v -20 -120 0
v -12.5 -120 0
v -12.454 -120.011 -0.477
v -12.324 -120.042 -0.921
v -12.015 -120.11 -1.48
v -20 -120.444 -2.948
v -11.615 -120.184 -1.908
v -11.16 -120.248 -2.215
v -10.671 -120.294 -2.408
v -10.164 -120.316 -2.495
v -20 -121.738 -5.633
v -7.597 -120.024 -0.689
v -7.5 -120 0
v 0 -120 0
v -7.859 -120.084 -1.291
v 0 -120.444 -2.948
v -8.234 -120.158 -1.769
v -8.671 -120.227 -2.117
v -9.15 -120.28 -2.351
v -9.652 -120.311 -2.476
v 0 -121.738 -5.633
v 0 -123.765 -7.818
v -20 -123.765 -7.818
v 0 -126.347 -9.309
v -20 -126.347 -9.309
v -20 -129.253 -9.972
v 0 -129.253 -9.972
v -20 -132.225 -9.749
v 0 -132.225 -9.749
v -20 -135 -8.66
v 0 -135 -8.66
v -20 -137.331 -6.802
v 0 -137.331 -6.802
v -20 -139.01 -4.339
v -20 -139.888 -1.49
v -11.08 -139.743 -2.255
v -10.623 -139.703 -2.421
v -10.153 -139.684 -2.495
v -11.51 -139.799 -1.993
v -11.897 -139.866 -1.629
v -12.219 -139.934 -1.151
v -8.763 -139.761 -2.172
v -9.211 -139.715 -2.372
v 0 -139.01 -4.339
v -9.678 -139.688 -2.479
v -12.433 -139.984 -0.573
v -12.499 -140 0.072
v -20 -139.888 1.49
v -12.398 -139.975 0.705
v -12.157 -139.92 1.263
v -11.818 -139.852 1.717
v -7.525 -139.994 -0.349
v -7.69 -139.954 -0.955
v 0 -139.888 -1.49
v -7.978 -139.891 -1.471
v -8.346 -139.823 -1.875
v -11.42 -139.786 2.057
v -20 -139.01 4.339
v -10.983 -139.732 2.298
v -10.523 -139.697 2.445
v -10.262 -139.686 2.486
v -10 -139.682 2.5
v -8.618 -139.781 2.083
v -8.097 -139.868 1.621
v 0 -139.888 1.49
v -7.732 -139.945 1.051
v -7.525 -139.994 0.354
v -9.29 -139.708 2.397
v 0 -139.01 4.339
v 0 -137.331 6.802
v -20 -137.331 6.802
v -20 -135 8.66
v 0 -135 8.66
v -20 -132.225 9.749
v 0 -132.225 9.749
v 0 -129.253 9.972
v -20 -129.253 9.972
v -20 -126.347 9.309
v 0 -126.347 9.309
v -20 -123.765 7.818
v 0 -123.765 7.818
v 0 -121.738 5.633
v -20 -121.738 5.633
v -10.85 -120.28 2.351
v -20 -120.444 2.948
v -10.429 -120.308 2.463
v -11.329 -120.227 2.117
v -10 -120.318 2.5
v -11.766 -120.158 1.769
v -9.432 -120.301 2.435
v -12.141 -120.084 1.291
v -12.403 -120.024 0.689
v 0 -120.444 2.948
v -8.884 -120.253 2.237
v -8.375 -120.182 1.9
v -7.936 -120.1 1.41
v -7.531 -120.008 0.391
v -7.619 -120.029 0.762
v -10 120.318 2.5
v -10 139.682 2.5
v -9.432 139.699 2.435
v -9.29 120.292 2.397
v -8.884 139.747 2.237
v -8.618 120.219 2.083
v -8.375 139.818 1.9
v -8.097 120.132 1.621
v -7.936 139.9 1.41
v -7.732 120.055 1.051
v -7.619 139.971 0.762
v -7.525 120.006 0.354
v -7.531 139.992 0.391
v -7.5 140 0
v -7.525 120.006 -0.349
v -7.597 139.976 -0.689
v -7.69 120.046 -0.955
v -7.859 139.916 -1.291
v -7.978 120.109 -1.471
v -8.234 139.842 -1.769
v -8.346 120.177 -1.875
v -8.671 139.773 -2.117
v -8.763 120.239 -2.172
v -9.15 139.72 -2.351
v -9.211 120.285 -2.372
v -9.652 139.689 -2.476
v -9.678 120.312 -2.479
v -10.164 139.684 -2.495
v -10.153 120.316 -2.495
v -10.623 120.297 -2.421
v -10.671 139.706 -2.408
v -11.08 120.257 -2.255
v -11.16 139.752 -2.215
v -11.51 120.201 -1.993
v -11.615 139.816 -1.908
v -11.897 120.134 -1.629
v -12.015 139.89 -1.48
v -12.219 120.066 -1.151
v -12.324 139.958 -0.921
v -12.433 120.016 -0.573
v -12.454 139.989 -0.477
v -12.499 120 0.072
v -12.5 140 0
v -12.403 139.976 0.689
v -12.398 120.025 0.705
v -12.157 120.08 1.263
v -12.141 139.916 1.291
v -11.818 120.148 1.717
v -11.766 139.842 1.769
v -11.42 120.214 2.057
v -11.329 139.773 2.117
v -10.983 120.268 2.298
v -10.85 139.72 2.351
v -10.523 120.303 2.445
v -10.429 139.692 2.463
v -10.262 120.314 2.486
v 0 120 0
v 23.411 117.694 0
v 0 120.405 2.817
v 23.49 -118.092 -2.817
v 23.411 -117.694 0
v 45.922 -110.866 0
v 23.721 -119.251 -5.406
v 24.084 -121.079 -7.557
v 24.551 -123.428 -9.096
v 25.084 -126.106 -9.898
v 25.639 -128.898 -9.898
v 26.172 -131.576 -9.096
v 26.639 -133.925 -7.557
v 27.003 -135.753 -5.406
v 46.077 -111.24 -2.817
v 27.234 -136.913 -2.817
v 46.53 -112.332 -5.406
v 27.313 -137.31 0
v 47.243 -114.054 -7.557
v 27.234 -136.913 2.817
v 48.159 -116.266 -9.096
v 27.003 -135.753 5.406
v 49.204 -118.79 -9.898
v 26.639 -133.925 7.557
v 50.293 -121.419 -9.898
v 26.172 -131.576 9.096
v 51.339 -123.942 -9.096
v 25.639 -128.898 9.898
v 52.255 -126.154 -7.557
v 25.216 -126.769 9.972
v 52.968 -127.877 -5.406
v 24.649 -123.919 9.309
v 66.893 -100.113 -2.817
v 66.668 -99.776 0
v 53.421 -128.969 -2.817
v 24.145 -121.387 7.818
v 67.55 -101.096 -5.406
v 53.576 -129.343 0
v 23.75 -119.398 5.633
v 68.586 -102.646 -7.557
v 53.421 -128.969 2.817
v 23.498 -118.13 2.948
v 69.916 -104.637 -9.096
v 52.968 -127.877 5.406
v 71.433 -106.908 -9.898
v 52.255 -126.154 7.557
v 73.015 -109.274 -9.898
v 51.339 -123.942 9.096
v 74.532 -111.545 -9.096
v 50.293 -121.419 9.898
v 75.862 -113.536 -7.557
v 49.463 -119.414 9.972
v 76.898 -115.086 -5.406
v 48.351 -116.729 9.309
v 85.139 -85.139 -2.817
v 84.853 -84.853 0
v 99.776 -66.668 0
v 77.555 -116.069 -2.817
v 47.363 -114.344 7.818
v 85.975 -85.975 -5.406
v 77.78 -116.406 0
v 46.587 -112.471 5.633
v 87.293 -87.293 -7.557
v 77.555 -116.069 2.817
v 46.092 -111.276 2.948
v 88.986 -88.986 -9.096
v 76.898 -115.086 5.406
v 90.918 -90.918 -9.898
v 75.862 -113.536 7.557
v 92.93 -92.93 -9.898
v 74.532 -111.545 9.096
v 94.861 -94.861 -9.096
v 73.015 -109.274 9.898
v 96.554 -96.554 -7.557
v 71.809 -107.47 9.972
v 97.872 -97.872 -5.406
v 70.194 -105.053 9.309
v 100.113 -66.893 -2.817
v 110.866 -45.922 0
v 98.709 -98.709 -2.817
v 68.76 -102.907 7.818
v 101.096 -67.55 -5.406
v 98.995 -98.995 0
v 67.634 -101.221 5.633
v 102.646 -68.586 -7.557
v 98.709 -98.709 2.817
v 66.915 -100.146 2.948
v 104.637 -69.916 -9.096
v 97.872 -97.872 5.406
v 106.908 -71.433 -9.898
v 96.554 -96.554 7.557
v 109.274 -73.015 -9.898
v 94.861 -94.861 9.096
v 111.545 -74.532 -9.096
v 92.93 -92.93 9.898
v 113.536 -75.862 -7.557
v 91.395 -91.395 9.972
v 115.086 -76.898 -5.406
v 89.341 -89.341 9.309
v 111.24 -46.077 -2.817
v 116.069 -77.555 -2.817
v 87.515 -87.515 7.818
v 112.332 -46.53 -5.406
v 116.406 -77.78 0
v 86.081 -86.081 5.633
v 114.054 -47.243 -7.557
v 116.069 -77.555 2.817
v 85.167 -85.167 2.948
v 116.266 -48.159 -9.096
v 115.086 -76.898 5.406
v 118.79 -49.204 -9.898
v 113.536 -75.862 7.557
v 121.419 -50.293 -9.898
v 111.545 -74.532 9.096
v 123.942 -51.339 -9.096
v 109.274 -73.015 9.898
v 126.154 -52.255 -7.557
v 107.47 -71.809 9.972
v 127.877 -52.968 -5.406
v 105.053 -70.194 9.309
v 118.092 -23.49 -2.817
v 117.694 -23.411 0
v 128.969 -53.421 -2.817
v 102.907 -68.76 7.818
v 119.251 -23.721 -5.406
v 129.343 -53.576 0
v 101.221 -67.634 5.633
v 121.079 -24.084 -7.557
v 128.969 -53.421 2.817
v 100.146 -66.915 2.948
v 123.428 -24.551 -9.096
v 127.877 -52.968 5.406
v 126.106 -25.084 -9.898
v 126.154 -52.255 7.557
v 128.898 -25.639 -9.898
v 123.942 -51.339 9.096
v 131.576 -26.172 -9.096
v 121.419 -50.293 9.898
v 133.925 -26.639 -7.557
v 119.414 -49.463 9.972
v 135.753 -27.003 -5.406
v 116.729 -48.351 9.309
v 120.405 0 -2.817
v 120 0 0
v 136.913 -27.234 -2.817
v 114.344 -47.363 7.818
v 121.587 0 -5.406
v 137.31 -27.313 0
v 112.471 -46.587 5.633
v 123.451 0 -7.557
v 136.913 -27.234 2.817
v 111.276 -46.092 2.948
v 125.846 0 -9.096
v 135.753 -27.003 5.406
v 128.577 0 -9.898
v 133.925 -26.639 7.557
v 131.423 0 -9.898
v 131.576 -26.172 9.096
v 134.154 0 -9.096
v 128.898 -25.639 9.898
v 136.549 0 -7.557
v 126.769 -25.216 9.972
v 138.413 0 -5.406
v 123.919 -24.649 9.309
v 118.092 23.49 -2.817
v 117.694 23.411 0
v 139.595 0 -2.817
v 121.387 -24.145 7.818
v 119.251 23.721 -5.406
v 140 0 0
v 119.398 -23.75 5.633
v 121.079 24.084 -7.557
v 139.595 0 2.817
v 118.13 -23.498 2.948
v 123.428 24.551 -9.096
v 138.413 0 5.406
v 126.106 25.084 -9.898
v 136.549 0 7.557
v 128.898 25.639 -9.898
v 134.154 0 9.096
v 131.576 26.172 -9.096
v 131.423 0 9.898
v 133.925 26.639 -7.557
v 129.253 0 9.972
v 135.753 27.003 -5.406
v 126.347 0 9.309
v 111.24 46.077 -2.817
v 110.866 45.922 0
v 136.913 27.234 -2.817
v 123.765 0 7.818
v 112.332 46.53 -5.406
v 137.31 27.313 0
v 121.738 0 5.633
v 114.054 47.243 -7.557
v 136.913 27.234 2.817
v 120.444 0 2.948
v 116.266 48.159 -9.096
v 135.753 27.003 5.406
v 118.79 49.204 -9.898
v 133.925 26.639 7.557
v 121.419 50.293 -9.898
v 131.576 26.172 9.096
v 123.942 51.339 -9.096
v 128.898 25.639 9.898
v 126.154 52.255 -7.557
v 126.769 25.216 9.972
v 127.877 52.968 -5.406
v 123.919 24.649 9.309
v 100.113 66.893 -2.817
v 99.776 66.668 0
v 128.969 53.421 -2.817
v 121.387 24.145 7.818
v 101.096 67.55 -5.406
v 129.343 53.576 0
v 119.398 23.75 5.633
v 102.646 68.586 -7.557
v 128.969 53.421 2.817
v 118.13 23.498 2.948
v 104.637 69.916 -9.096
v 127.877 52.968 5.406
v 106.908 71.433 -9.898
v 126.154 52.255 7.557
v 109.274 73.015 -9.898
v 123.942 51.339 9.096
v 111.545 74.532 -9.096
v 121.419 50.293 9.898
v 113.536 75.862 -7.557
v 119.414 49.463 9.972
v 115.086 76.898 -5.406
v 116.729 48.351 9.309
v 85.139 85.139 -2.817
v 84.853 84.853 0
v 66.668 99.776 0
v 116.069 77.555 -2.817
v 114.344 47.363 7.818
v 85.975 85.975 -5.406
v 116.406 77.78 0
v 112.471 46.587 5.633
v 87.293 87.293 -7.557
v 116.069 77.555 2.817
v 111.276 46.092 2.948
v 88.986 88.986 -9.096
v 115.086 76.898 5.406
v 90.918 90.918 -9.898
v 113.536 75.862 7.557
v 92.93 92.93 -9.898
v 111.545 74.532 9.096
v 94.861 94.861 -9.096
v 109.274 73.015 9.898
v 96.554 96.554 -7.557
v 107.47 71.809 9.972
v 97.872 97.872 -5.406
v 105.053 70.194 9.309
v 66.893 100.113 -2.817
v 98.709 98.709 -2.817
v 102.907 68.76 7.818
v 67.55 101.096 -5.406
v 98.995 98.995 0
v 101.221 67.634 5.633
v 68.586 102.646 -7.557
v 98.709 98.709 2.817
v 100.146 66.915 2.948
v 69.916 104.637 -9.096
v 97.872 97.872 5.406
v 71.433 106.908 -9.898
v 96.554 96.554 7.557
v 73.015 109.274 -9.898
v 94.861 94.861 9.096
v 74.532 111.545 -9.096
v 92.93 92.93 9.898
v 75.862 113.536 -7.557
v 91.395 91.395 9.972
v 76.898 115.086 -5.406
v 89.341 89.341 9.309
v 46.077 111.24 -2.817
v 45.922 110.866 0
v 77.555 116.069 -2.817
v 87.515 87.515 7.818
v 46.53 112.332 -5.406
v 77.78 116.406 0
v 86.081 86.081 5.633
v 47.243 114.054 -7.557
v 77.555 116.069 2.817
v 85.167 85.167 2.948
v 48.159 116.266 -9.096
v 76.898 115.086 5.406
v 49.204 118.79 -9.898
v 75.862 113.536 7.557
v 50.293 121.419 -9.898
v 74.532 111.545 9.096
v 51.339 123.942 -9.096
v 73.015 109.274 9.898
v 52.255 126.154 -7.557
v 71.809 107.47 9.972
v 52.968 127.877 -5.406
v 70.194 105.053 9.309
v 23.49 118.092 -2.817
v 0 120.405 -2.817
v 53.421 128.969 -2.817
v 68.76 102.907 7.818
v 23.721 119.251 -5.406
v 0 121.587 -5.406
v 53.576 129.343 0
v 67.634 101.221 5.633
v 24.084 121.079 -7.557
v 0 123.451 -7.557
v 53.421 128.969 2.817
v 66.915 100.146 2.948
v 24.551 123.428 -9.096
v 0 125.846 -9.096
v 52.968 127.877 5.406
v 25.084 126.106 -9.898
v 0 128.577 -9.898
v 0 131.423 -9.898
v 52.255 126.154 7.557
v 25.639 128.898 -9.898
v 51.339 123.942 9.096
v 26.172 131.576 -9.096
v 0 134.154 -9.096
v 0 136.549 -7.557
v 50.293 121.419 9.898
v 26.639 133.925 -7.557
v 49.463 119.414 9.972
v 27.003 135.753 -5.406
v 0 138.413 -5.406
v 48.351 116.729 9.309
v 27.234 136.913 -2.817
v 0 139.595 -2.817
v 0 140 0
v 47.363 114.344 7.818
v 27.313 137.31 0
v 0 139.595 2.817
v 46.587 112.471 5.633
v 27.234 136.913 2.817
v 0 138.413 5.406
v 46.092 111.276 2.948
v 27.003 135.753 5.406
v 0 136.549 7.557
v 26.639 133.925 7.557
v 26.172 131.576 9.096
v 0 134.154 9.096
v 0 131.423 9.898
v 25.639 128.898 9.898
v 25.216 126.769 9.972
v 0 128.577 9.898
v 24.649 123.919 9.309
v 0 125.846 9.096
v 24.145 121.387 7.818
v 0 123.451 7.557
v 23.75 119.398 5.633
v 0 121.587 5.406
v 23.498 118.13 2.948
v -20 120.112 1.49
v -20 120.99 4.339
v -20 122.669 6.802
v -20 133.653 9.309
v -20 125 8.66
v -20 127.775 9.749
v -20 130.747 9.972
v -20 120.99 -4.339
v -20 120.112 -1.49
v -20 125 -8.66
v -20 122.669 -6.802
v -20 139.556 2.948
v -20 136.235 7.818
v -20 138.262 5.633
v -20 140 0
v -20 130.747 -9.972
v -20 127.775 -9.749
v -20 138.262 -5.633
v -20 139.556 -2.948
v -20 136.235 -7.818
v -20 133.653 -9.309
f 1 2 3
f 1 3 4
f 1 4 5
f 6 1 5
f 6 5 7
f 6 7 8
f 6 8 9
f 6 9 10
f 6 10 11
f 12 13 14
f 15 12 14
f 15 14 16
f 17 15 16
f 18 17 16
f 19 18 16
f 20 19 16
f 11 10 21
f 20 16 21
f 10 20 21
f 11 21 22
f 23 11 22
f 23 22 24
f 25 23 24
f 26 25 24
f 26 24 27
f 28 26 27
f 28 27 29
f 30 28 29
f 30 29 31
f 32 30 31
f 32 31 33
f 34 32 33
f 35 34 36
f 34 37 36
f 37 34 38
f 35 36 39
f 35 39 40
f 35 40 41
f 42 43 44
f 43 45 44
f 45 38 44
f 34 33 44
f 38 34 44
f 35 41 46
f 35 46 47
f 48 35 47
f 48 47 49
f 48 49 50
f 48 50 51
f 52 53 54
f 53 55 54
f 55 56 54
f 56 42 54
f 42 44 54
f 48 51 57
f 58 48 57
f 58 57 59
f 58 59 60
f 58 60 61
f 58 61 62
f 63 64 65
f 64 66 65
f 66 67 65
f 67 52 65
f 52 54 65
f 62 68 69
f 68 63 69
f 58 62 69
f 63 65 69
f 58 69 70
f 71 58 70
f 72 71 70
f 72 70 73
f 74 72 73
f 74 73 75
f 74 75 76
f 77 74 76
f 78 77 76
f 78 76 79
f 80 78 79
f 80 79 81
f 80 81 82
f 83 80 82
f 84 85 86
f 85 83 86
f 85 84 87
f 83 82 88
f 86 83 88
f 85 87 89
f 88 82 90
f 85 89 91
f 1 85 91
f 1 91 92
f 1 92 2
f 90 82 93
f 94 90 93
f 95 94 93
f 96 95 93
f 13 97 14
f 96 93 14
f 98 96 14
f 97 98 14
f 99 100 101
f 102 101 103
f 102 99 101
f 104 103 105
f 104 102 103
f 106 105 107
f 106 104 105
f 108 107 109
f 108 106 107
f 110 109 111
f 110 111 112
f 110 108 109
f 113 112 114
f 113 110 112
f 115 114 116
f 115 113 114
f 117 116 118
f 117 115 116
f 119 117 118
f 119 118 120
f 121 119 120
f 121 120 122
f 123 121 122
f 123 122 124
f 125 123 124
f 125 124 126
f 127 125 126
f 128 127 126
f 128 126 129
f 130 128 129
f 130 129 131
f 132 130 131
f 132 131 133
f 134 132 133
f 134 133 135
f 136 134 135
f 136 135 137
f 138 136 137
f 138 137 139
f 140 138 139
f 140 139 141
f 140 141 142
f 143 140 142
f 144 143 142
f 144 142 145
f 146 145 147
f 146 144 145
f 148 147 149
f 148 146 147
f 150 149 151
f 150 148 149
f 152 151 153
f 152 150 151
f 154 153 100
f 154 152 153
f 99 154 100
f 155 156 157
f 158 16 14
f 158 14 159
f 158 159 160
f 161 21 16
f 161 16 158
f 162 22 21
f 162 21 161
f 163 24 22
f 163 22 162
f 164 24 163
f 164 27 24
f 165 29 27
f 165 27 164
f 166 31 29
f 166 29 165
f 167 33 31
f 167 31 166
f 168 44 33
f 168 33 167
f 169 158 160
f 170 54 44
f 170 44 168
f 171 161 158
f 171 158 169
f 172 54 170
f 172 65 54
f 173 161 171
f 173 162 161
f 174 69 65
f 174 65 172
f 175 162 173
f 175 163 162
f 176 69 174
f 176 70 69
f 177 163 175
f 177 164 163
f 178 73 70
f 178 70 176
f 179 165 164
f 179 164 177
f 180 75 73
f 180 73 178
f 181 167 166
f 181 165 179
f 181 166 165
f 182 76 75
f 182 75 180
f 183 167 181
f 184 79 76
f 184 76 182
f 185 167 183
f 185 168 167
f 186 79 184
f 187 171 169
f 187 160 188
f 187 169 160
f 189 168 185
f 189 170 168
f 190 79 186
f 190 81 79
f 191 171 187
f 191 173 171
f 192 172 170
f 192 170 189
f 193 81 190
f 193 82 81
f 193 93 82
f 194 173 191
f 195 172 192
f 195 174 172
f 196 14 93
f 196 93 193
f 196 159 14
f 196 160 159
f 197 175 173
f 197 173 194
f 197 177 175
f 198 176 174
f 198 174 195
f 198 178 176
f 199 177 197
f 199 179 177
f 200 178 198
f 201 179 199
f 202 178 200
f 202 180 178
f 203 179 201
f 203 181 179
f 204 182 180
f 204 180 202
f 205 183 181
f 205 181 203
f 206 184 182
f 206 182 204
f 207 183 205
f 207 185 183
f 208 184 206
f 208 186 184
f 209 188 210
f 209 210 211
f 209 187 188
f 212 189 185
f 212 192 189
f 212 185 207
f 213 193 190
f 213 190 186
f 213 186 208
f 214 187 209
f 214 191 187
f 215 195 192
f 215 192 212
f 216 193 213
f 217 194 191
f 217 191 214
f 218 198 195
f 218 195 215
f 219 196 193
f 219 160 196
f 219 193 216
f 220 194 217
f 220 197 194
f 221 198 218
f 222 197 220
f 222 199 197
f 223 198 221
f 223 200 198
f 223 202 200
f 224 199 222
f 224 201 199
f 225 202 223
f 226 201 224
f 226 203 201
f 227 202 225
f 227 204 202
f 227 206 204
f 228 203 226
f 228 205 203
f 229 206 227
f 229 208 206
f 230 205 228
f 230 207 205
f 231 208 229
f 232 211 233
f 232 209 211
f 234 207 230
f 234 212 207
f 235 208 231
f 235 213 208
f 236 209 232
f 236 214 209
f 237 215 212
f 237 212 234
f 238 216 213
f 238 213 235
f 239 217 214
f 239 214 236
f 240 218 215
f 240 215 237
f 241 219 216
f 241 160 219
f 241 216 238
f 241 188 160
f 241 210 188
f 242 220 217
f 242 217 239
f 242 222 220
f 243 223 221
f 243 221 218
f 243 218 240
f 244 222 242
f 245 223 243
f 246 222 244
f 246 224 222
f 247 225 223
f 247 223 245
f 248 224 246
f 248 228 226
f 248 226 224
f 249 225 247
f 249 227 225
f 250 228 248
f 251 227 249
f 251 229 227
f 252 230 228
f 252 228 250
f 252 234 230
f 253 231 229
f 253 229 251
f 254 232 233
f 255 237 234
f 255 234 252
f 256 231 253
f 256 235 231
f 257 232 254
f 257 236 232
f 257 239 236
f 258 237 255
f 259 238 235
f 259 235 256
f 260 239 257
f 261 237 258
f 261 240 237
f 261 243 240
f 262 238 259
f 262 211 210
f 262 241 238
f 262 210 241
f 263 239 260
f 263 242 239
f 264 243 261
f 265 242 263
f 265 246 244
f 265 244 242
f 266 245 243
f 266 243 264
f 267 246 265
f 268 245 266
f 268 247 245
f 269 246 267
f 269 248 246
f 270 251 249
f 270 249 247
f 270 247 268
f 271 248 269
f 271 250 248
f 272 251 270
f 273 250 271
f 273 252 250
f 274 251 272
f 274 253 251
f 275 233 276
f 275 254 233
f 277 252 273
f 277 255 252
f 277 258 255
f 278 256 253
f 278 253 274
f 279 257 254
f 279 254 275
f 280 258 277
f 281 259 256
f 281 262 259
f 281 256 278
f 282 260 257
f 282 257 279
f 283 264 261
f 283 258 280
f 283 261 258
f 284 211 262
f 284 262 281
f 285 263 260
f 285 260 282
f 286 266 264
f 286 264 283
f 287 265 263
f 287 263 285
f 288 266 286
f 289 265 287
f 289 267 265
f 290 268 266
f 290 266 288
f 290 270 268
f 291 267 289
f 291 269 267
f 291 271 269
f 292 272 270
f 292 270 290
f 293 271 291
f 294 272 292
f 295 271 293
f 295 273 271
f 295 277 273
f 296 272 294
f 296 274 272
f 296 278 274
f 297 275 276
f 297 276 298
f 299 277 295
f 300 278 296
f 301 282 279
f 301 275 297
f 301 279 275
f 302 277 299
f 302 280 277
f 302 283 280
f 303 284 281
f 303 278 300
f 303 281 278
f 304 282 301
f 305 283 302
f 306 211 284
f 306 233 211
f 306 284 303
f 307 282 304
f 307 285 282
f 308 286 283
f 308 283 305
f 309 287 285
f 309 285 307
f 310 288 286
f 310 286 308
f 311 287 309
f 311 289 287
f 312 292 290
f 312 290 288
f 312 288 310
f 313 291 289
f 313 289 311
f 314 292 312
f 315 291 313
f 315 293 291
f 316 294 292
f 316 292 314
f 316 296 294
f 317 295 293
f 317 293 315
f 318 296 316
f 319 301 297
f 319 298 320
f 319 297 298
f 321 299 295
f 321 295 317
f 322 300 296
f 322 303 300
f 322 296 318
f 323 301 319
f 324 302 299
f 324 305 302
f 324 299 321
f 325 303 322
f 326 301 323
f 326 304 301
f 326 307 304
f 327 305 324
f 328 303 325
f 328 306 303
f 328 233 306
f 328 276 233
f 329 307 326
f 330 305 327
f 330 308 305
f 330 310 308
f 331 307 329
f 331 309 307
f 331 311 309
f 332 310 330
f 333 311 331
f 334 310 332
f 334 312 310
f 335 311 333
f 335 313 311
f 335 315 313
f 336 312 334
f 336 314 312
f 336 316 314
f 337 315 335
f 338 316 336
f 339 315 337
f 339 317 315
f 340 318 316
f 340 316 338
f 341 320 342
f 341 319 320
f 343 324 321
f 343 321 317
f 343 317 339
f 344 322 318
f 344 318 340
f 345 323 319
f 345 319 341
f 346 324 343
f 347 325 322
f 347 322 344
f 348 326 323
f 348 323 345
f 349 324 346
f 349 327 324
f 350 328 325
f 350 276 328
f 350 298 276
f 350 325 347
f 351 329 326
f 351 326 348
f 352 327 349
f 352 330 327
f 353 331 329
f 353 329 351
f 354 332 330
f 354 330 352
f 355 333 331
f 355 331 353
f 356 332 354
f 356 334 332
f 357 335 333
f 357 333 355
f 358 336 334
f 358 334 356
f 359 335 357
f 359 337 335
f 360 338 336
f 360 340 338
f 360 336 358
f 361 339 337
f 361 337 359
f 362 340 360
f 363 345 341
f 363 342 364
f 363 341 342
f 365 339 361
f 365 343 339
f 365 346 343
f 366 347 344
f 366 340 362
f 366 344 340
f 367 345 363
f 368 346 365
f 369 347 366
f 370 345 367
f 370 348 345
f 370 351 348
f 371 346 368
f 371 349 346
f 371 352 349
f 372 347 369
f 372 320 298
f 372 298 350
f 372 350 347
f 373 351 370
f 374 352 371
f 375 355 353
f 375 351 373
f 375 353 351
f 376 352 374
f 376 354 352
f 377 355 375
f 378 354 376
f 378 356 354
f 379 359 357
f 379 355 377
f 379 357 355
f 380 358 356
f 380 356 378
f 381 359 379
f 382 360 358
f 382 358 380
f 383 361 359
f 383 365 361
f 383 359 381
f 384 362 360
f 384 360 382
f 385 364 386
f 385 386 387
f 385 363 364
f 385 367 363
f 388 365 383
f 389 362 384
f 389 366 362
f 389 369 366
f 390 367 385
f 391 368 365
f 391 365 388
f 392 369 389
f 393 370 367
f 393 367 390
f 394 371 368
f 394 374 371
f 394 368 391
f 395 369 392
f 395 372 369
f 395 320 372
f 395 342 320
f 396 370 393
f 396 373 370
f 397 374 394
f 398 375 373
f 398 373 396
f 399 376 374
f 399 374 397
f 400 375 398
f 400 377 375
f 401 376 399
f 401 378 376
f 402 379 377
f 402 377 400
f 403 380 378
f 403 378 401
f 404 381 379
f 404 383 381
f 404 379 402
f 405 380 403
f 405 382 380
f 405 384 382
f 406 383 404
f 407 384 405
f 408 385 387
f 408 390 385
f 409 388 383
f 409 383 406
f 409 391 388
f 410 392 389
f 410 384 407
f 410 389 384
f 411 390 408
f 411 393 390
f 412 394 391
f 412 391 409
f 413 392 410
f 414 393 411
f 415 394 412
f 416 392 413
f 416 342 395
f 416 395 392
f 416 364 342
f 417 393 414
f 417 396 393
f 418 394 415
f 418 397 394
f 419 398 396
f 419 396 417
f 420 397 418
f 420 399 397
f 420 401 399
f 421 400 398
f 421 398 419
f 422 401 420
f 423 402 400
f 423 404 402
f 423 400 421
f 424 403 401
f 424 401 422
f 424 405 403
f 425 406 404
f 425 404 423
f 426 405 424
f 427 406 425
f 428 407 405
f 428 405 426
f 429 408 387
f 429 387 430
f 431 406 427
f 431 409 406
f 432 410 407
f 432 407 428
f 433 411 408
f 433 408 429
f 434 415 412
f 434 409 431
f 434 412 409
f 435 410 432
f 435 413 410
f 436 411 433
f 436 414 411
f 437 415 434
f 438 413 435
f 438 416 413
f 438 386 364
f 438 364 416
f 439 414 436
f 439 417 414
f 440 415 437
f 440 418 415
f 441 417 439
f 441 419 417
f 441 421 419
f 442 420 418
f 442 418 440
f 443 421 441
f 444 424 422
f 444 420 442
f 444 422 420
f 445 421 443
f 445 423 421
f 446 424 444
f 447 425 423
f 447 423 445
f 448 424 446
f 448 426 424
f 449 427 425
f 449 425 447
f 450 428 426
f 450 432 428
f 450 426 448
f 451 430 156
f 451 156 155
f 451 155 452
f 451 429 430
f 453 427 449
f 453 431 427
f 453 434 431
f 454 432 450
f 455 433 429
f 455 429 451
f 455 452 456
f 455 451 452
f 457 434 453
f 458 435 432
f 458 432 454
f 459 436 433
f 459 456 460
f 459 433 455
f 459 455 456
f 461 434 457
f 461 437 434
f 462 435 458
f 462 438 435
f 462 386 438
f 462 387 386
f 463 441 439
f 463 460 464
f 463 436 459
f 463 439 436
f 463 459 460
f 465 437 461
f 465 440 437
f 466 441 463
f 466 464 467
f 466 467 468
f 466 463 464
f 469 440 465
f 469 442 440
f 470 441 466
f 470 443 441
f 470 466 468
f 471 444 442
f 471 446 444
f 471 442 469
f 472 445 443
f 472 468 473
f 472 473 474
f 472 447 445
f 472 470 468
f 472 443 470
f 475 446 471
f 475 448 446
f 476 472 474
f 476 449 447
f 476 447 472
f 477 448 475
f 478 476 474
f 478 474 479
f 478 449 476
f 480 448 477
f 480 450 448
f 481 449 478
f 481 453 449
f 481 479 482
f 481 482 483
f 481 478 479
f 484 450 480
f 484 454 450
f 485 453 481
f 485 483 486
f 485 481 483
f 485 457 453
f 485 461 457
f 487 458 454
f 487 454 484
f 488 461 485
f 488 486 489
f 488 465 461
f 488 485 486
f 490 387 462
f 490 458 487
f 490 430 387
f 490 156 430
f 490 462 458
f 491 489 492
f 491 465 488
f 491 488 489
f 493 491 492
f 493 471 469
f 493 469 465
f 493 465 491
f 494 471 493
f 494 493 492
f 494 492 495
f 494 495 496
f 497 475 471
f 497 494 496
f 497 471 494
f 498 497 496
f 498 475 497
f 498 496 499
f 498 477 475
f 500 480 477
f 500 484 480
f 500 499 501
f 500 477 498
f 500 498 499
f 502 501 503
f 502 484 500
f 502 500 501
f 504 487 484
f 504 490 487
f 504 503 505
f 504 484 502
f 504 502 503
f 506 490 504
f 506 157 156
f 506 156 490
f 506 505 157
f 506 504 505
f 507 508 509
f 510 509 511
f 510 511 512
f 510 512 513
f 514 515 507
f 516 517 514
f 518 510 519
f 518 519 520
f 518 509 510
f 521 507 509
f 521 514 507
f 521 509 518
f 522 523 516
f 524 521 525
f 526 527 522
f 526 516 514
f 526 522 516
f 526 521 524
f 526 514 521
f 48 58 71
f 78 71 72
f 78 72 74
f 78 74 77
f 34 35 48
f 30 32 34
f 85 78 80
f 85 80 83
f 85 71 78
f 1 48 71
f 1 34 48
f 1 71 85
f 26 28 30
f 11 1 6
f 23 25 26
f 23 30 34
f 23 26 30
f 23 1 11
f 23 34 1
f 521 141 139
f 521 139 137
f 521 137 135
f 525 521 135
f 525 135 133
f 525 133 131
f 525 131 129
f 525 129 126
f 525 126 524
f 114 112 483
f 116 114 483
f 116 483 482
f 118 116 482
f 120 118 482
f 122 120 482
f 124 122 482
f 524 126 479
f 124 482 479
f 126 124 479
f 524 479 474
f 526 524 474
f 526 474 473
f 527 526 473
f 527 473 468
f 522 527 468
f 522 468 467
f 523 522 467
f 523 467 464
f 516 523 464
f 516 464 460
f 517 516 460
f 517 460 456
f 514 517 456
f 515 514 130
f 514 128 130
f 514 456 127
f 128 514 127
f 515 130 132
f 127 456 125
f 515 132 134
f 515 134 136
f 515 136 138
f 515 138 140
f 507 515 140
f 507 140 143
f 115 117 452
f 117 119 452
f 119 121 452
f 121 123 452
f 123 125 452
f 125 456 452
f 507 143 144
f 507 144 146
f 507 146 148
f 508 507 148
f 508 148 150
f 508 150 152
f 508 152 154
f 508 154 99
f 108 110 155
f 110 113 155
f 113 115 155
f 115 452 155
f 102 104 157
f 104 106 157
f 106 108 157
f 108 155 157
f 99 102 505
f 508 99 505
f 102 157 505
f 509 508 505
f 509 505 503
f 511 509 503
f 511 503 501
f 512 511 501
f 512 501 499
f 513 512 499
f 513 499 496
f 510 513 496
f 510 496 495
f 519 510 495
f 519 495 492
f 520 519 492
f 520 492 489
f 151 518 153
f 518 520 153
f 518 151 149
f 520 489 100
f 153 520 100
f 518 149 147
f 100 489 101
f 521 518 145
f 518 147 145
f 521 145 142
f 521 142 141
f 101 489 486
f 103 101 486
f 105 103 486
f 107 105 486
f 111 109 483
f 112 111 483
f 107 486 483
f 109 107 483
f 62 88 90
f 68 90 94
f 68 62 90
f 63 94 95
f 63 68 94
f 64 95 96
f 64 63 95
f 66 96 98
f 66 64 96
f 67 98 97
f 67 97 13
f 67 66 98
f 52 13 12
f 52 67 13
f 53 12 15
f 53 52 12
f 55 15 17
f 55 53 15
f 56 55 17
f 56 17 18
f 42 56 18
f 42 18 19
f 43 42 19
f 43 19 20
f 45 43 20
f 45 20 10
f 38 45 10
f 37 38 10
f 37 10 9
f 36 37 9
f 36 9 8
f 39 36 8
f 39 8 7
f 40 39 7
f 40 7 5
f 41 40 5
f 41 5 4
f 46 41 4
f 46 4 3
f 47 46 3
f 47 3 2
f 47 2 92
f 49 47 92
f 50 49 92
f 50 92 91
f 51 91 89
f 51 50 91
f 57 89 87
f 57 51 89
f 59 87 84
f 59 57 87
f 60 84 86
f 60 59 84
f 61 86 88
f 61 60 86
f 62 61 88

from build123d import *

# Parameters (mm, degrees)
BALAYAGE2_PROFILE_R          = 10
ESQUISSE38_R                 = 10
BOSS_EXTRU_1_DEPTH           = 20
ESQUISSE39_R                 = 10
BOSS_EXTRU_2_DEPTH           = 20
ENL_V_MAT_EXTRU_1_DEPTH      = 199.242276162
ENL_V_MAT_EXTRU_1_DEPTH_BACK = 199.242276162
ESQUISSE41_R                 = 2.5


with BuildPart() as part:
    # Balayage2: sweep along a path in Esquisse2
    with BuildLine(Plane.XY) as balayage2_path:
        ThreePointArc((0, -130), (130, 0), (0, 130))
    # Balayage2 profile (on start of the path) → Balayage2 (sweep)
    with BuildSketch(Plane(origin=(0, -130, 0), x_dir=(0, 1, 0), z_dir=(1, 0, 0))):
        Circle(BALAYAGE2_PROFILE_R)
    sweep(path=balayage2_path.line)

    # Esquisse38 → Boss.-Extru.1 (add)
    with BuildSketch(Plane.ZY):
        with Locations(Location((0, -130, 0), (0, 0, 90))):
            Circle(ESQUISSE38_R)
    extrude(amount=BOSS_EXTRU_1_DEPTH)

    # Esquisse39 → Boss.-Extru.2 (add)
    with BuildSketch(Plane.ZY):
        with Locations(Location((0, 130, 0), (0, 0, 90))):
            Circle(ESQUISSE39_R)
    extrude(amount=BOSS_EXTRU_2_DEPTH)

    # Esquisse41 → Enlèv. mat.-Extru.1 (cut, two sides: drawn at the far end of the back side and taken through both)
    with BuildSketch(Plane(origin=(0, 0, 0), x_dir=(1, 0, 0), z_dir=(0, 1, 0)).offset(-ENL_V_MAT_EXTRU_1_DEPTH_BACK)):
        with Locations(Location((-10, 0, 0), (0, 0, 270))):
            Circle(ESQUISSE41_R)
    extrude(amount=ENL_V_MAT_EXTRU_1_DEPTH + ENL_V_MAT_EXTRU_1_DEPTH_BACK, mode=Mode.SUBTRACT)


solid = part.part
